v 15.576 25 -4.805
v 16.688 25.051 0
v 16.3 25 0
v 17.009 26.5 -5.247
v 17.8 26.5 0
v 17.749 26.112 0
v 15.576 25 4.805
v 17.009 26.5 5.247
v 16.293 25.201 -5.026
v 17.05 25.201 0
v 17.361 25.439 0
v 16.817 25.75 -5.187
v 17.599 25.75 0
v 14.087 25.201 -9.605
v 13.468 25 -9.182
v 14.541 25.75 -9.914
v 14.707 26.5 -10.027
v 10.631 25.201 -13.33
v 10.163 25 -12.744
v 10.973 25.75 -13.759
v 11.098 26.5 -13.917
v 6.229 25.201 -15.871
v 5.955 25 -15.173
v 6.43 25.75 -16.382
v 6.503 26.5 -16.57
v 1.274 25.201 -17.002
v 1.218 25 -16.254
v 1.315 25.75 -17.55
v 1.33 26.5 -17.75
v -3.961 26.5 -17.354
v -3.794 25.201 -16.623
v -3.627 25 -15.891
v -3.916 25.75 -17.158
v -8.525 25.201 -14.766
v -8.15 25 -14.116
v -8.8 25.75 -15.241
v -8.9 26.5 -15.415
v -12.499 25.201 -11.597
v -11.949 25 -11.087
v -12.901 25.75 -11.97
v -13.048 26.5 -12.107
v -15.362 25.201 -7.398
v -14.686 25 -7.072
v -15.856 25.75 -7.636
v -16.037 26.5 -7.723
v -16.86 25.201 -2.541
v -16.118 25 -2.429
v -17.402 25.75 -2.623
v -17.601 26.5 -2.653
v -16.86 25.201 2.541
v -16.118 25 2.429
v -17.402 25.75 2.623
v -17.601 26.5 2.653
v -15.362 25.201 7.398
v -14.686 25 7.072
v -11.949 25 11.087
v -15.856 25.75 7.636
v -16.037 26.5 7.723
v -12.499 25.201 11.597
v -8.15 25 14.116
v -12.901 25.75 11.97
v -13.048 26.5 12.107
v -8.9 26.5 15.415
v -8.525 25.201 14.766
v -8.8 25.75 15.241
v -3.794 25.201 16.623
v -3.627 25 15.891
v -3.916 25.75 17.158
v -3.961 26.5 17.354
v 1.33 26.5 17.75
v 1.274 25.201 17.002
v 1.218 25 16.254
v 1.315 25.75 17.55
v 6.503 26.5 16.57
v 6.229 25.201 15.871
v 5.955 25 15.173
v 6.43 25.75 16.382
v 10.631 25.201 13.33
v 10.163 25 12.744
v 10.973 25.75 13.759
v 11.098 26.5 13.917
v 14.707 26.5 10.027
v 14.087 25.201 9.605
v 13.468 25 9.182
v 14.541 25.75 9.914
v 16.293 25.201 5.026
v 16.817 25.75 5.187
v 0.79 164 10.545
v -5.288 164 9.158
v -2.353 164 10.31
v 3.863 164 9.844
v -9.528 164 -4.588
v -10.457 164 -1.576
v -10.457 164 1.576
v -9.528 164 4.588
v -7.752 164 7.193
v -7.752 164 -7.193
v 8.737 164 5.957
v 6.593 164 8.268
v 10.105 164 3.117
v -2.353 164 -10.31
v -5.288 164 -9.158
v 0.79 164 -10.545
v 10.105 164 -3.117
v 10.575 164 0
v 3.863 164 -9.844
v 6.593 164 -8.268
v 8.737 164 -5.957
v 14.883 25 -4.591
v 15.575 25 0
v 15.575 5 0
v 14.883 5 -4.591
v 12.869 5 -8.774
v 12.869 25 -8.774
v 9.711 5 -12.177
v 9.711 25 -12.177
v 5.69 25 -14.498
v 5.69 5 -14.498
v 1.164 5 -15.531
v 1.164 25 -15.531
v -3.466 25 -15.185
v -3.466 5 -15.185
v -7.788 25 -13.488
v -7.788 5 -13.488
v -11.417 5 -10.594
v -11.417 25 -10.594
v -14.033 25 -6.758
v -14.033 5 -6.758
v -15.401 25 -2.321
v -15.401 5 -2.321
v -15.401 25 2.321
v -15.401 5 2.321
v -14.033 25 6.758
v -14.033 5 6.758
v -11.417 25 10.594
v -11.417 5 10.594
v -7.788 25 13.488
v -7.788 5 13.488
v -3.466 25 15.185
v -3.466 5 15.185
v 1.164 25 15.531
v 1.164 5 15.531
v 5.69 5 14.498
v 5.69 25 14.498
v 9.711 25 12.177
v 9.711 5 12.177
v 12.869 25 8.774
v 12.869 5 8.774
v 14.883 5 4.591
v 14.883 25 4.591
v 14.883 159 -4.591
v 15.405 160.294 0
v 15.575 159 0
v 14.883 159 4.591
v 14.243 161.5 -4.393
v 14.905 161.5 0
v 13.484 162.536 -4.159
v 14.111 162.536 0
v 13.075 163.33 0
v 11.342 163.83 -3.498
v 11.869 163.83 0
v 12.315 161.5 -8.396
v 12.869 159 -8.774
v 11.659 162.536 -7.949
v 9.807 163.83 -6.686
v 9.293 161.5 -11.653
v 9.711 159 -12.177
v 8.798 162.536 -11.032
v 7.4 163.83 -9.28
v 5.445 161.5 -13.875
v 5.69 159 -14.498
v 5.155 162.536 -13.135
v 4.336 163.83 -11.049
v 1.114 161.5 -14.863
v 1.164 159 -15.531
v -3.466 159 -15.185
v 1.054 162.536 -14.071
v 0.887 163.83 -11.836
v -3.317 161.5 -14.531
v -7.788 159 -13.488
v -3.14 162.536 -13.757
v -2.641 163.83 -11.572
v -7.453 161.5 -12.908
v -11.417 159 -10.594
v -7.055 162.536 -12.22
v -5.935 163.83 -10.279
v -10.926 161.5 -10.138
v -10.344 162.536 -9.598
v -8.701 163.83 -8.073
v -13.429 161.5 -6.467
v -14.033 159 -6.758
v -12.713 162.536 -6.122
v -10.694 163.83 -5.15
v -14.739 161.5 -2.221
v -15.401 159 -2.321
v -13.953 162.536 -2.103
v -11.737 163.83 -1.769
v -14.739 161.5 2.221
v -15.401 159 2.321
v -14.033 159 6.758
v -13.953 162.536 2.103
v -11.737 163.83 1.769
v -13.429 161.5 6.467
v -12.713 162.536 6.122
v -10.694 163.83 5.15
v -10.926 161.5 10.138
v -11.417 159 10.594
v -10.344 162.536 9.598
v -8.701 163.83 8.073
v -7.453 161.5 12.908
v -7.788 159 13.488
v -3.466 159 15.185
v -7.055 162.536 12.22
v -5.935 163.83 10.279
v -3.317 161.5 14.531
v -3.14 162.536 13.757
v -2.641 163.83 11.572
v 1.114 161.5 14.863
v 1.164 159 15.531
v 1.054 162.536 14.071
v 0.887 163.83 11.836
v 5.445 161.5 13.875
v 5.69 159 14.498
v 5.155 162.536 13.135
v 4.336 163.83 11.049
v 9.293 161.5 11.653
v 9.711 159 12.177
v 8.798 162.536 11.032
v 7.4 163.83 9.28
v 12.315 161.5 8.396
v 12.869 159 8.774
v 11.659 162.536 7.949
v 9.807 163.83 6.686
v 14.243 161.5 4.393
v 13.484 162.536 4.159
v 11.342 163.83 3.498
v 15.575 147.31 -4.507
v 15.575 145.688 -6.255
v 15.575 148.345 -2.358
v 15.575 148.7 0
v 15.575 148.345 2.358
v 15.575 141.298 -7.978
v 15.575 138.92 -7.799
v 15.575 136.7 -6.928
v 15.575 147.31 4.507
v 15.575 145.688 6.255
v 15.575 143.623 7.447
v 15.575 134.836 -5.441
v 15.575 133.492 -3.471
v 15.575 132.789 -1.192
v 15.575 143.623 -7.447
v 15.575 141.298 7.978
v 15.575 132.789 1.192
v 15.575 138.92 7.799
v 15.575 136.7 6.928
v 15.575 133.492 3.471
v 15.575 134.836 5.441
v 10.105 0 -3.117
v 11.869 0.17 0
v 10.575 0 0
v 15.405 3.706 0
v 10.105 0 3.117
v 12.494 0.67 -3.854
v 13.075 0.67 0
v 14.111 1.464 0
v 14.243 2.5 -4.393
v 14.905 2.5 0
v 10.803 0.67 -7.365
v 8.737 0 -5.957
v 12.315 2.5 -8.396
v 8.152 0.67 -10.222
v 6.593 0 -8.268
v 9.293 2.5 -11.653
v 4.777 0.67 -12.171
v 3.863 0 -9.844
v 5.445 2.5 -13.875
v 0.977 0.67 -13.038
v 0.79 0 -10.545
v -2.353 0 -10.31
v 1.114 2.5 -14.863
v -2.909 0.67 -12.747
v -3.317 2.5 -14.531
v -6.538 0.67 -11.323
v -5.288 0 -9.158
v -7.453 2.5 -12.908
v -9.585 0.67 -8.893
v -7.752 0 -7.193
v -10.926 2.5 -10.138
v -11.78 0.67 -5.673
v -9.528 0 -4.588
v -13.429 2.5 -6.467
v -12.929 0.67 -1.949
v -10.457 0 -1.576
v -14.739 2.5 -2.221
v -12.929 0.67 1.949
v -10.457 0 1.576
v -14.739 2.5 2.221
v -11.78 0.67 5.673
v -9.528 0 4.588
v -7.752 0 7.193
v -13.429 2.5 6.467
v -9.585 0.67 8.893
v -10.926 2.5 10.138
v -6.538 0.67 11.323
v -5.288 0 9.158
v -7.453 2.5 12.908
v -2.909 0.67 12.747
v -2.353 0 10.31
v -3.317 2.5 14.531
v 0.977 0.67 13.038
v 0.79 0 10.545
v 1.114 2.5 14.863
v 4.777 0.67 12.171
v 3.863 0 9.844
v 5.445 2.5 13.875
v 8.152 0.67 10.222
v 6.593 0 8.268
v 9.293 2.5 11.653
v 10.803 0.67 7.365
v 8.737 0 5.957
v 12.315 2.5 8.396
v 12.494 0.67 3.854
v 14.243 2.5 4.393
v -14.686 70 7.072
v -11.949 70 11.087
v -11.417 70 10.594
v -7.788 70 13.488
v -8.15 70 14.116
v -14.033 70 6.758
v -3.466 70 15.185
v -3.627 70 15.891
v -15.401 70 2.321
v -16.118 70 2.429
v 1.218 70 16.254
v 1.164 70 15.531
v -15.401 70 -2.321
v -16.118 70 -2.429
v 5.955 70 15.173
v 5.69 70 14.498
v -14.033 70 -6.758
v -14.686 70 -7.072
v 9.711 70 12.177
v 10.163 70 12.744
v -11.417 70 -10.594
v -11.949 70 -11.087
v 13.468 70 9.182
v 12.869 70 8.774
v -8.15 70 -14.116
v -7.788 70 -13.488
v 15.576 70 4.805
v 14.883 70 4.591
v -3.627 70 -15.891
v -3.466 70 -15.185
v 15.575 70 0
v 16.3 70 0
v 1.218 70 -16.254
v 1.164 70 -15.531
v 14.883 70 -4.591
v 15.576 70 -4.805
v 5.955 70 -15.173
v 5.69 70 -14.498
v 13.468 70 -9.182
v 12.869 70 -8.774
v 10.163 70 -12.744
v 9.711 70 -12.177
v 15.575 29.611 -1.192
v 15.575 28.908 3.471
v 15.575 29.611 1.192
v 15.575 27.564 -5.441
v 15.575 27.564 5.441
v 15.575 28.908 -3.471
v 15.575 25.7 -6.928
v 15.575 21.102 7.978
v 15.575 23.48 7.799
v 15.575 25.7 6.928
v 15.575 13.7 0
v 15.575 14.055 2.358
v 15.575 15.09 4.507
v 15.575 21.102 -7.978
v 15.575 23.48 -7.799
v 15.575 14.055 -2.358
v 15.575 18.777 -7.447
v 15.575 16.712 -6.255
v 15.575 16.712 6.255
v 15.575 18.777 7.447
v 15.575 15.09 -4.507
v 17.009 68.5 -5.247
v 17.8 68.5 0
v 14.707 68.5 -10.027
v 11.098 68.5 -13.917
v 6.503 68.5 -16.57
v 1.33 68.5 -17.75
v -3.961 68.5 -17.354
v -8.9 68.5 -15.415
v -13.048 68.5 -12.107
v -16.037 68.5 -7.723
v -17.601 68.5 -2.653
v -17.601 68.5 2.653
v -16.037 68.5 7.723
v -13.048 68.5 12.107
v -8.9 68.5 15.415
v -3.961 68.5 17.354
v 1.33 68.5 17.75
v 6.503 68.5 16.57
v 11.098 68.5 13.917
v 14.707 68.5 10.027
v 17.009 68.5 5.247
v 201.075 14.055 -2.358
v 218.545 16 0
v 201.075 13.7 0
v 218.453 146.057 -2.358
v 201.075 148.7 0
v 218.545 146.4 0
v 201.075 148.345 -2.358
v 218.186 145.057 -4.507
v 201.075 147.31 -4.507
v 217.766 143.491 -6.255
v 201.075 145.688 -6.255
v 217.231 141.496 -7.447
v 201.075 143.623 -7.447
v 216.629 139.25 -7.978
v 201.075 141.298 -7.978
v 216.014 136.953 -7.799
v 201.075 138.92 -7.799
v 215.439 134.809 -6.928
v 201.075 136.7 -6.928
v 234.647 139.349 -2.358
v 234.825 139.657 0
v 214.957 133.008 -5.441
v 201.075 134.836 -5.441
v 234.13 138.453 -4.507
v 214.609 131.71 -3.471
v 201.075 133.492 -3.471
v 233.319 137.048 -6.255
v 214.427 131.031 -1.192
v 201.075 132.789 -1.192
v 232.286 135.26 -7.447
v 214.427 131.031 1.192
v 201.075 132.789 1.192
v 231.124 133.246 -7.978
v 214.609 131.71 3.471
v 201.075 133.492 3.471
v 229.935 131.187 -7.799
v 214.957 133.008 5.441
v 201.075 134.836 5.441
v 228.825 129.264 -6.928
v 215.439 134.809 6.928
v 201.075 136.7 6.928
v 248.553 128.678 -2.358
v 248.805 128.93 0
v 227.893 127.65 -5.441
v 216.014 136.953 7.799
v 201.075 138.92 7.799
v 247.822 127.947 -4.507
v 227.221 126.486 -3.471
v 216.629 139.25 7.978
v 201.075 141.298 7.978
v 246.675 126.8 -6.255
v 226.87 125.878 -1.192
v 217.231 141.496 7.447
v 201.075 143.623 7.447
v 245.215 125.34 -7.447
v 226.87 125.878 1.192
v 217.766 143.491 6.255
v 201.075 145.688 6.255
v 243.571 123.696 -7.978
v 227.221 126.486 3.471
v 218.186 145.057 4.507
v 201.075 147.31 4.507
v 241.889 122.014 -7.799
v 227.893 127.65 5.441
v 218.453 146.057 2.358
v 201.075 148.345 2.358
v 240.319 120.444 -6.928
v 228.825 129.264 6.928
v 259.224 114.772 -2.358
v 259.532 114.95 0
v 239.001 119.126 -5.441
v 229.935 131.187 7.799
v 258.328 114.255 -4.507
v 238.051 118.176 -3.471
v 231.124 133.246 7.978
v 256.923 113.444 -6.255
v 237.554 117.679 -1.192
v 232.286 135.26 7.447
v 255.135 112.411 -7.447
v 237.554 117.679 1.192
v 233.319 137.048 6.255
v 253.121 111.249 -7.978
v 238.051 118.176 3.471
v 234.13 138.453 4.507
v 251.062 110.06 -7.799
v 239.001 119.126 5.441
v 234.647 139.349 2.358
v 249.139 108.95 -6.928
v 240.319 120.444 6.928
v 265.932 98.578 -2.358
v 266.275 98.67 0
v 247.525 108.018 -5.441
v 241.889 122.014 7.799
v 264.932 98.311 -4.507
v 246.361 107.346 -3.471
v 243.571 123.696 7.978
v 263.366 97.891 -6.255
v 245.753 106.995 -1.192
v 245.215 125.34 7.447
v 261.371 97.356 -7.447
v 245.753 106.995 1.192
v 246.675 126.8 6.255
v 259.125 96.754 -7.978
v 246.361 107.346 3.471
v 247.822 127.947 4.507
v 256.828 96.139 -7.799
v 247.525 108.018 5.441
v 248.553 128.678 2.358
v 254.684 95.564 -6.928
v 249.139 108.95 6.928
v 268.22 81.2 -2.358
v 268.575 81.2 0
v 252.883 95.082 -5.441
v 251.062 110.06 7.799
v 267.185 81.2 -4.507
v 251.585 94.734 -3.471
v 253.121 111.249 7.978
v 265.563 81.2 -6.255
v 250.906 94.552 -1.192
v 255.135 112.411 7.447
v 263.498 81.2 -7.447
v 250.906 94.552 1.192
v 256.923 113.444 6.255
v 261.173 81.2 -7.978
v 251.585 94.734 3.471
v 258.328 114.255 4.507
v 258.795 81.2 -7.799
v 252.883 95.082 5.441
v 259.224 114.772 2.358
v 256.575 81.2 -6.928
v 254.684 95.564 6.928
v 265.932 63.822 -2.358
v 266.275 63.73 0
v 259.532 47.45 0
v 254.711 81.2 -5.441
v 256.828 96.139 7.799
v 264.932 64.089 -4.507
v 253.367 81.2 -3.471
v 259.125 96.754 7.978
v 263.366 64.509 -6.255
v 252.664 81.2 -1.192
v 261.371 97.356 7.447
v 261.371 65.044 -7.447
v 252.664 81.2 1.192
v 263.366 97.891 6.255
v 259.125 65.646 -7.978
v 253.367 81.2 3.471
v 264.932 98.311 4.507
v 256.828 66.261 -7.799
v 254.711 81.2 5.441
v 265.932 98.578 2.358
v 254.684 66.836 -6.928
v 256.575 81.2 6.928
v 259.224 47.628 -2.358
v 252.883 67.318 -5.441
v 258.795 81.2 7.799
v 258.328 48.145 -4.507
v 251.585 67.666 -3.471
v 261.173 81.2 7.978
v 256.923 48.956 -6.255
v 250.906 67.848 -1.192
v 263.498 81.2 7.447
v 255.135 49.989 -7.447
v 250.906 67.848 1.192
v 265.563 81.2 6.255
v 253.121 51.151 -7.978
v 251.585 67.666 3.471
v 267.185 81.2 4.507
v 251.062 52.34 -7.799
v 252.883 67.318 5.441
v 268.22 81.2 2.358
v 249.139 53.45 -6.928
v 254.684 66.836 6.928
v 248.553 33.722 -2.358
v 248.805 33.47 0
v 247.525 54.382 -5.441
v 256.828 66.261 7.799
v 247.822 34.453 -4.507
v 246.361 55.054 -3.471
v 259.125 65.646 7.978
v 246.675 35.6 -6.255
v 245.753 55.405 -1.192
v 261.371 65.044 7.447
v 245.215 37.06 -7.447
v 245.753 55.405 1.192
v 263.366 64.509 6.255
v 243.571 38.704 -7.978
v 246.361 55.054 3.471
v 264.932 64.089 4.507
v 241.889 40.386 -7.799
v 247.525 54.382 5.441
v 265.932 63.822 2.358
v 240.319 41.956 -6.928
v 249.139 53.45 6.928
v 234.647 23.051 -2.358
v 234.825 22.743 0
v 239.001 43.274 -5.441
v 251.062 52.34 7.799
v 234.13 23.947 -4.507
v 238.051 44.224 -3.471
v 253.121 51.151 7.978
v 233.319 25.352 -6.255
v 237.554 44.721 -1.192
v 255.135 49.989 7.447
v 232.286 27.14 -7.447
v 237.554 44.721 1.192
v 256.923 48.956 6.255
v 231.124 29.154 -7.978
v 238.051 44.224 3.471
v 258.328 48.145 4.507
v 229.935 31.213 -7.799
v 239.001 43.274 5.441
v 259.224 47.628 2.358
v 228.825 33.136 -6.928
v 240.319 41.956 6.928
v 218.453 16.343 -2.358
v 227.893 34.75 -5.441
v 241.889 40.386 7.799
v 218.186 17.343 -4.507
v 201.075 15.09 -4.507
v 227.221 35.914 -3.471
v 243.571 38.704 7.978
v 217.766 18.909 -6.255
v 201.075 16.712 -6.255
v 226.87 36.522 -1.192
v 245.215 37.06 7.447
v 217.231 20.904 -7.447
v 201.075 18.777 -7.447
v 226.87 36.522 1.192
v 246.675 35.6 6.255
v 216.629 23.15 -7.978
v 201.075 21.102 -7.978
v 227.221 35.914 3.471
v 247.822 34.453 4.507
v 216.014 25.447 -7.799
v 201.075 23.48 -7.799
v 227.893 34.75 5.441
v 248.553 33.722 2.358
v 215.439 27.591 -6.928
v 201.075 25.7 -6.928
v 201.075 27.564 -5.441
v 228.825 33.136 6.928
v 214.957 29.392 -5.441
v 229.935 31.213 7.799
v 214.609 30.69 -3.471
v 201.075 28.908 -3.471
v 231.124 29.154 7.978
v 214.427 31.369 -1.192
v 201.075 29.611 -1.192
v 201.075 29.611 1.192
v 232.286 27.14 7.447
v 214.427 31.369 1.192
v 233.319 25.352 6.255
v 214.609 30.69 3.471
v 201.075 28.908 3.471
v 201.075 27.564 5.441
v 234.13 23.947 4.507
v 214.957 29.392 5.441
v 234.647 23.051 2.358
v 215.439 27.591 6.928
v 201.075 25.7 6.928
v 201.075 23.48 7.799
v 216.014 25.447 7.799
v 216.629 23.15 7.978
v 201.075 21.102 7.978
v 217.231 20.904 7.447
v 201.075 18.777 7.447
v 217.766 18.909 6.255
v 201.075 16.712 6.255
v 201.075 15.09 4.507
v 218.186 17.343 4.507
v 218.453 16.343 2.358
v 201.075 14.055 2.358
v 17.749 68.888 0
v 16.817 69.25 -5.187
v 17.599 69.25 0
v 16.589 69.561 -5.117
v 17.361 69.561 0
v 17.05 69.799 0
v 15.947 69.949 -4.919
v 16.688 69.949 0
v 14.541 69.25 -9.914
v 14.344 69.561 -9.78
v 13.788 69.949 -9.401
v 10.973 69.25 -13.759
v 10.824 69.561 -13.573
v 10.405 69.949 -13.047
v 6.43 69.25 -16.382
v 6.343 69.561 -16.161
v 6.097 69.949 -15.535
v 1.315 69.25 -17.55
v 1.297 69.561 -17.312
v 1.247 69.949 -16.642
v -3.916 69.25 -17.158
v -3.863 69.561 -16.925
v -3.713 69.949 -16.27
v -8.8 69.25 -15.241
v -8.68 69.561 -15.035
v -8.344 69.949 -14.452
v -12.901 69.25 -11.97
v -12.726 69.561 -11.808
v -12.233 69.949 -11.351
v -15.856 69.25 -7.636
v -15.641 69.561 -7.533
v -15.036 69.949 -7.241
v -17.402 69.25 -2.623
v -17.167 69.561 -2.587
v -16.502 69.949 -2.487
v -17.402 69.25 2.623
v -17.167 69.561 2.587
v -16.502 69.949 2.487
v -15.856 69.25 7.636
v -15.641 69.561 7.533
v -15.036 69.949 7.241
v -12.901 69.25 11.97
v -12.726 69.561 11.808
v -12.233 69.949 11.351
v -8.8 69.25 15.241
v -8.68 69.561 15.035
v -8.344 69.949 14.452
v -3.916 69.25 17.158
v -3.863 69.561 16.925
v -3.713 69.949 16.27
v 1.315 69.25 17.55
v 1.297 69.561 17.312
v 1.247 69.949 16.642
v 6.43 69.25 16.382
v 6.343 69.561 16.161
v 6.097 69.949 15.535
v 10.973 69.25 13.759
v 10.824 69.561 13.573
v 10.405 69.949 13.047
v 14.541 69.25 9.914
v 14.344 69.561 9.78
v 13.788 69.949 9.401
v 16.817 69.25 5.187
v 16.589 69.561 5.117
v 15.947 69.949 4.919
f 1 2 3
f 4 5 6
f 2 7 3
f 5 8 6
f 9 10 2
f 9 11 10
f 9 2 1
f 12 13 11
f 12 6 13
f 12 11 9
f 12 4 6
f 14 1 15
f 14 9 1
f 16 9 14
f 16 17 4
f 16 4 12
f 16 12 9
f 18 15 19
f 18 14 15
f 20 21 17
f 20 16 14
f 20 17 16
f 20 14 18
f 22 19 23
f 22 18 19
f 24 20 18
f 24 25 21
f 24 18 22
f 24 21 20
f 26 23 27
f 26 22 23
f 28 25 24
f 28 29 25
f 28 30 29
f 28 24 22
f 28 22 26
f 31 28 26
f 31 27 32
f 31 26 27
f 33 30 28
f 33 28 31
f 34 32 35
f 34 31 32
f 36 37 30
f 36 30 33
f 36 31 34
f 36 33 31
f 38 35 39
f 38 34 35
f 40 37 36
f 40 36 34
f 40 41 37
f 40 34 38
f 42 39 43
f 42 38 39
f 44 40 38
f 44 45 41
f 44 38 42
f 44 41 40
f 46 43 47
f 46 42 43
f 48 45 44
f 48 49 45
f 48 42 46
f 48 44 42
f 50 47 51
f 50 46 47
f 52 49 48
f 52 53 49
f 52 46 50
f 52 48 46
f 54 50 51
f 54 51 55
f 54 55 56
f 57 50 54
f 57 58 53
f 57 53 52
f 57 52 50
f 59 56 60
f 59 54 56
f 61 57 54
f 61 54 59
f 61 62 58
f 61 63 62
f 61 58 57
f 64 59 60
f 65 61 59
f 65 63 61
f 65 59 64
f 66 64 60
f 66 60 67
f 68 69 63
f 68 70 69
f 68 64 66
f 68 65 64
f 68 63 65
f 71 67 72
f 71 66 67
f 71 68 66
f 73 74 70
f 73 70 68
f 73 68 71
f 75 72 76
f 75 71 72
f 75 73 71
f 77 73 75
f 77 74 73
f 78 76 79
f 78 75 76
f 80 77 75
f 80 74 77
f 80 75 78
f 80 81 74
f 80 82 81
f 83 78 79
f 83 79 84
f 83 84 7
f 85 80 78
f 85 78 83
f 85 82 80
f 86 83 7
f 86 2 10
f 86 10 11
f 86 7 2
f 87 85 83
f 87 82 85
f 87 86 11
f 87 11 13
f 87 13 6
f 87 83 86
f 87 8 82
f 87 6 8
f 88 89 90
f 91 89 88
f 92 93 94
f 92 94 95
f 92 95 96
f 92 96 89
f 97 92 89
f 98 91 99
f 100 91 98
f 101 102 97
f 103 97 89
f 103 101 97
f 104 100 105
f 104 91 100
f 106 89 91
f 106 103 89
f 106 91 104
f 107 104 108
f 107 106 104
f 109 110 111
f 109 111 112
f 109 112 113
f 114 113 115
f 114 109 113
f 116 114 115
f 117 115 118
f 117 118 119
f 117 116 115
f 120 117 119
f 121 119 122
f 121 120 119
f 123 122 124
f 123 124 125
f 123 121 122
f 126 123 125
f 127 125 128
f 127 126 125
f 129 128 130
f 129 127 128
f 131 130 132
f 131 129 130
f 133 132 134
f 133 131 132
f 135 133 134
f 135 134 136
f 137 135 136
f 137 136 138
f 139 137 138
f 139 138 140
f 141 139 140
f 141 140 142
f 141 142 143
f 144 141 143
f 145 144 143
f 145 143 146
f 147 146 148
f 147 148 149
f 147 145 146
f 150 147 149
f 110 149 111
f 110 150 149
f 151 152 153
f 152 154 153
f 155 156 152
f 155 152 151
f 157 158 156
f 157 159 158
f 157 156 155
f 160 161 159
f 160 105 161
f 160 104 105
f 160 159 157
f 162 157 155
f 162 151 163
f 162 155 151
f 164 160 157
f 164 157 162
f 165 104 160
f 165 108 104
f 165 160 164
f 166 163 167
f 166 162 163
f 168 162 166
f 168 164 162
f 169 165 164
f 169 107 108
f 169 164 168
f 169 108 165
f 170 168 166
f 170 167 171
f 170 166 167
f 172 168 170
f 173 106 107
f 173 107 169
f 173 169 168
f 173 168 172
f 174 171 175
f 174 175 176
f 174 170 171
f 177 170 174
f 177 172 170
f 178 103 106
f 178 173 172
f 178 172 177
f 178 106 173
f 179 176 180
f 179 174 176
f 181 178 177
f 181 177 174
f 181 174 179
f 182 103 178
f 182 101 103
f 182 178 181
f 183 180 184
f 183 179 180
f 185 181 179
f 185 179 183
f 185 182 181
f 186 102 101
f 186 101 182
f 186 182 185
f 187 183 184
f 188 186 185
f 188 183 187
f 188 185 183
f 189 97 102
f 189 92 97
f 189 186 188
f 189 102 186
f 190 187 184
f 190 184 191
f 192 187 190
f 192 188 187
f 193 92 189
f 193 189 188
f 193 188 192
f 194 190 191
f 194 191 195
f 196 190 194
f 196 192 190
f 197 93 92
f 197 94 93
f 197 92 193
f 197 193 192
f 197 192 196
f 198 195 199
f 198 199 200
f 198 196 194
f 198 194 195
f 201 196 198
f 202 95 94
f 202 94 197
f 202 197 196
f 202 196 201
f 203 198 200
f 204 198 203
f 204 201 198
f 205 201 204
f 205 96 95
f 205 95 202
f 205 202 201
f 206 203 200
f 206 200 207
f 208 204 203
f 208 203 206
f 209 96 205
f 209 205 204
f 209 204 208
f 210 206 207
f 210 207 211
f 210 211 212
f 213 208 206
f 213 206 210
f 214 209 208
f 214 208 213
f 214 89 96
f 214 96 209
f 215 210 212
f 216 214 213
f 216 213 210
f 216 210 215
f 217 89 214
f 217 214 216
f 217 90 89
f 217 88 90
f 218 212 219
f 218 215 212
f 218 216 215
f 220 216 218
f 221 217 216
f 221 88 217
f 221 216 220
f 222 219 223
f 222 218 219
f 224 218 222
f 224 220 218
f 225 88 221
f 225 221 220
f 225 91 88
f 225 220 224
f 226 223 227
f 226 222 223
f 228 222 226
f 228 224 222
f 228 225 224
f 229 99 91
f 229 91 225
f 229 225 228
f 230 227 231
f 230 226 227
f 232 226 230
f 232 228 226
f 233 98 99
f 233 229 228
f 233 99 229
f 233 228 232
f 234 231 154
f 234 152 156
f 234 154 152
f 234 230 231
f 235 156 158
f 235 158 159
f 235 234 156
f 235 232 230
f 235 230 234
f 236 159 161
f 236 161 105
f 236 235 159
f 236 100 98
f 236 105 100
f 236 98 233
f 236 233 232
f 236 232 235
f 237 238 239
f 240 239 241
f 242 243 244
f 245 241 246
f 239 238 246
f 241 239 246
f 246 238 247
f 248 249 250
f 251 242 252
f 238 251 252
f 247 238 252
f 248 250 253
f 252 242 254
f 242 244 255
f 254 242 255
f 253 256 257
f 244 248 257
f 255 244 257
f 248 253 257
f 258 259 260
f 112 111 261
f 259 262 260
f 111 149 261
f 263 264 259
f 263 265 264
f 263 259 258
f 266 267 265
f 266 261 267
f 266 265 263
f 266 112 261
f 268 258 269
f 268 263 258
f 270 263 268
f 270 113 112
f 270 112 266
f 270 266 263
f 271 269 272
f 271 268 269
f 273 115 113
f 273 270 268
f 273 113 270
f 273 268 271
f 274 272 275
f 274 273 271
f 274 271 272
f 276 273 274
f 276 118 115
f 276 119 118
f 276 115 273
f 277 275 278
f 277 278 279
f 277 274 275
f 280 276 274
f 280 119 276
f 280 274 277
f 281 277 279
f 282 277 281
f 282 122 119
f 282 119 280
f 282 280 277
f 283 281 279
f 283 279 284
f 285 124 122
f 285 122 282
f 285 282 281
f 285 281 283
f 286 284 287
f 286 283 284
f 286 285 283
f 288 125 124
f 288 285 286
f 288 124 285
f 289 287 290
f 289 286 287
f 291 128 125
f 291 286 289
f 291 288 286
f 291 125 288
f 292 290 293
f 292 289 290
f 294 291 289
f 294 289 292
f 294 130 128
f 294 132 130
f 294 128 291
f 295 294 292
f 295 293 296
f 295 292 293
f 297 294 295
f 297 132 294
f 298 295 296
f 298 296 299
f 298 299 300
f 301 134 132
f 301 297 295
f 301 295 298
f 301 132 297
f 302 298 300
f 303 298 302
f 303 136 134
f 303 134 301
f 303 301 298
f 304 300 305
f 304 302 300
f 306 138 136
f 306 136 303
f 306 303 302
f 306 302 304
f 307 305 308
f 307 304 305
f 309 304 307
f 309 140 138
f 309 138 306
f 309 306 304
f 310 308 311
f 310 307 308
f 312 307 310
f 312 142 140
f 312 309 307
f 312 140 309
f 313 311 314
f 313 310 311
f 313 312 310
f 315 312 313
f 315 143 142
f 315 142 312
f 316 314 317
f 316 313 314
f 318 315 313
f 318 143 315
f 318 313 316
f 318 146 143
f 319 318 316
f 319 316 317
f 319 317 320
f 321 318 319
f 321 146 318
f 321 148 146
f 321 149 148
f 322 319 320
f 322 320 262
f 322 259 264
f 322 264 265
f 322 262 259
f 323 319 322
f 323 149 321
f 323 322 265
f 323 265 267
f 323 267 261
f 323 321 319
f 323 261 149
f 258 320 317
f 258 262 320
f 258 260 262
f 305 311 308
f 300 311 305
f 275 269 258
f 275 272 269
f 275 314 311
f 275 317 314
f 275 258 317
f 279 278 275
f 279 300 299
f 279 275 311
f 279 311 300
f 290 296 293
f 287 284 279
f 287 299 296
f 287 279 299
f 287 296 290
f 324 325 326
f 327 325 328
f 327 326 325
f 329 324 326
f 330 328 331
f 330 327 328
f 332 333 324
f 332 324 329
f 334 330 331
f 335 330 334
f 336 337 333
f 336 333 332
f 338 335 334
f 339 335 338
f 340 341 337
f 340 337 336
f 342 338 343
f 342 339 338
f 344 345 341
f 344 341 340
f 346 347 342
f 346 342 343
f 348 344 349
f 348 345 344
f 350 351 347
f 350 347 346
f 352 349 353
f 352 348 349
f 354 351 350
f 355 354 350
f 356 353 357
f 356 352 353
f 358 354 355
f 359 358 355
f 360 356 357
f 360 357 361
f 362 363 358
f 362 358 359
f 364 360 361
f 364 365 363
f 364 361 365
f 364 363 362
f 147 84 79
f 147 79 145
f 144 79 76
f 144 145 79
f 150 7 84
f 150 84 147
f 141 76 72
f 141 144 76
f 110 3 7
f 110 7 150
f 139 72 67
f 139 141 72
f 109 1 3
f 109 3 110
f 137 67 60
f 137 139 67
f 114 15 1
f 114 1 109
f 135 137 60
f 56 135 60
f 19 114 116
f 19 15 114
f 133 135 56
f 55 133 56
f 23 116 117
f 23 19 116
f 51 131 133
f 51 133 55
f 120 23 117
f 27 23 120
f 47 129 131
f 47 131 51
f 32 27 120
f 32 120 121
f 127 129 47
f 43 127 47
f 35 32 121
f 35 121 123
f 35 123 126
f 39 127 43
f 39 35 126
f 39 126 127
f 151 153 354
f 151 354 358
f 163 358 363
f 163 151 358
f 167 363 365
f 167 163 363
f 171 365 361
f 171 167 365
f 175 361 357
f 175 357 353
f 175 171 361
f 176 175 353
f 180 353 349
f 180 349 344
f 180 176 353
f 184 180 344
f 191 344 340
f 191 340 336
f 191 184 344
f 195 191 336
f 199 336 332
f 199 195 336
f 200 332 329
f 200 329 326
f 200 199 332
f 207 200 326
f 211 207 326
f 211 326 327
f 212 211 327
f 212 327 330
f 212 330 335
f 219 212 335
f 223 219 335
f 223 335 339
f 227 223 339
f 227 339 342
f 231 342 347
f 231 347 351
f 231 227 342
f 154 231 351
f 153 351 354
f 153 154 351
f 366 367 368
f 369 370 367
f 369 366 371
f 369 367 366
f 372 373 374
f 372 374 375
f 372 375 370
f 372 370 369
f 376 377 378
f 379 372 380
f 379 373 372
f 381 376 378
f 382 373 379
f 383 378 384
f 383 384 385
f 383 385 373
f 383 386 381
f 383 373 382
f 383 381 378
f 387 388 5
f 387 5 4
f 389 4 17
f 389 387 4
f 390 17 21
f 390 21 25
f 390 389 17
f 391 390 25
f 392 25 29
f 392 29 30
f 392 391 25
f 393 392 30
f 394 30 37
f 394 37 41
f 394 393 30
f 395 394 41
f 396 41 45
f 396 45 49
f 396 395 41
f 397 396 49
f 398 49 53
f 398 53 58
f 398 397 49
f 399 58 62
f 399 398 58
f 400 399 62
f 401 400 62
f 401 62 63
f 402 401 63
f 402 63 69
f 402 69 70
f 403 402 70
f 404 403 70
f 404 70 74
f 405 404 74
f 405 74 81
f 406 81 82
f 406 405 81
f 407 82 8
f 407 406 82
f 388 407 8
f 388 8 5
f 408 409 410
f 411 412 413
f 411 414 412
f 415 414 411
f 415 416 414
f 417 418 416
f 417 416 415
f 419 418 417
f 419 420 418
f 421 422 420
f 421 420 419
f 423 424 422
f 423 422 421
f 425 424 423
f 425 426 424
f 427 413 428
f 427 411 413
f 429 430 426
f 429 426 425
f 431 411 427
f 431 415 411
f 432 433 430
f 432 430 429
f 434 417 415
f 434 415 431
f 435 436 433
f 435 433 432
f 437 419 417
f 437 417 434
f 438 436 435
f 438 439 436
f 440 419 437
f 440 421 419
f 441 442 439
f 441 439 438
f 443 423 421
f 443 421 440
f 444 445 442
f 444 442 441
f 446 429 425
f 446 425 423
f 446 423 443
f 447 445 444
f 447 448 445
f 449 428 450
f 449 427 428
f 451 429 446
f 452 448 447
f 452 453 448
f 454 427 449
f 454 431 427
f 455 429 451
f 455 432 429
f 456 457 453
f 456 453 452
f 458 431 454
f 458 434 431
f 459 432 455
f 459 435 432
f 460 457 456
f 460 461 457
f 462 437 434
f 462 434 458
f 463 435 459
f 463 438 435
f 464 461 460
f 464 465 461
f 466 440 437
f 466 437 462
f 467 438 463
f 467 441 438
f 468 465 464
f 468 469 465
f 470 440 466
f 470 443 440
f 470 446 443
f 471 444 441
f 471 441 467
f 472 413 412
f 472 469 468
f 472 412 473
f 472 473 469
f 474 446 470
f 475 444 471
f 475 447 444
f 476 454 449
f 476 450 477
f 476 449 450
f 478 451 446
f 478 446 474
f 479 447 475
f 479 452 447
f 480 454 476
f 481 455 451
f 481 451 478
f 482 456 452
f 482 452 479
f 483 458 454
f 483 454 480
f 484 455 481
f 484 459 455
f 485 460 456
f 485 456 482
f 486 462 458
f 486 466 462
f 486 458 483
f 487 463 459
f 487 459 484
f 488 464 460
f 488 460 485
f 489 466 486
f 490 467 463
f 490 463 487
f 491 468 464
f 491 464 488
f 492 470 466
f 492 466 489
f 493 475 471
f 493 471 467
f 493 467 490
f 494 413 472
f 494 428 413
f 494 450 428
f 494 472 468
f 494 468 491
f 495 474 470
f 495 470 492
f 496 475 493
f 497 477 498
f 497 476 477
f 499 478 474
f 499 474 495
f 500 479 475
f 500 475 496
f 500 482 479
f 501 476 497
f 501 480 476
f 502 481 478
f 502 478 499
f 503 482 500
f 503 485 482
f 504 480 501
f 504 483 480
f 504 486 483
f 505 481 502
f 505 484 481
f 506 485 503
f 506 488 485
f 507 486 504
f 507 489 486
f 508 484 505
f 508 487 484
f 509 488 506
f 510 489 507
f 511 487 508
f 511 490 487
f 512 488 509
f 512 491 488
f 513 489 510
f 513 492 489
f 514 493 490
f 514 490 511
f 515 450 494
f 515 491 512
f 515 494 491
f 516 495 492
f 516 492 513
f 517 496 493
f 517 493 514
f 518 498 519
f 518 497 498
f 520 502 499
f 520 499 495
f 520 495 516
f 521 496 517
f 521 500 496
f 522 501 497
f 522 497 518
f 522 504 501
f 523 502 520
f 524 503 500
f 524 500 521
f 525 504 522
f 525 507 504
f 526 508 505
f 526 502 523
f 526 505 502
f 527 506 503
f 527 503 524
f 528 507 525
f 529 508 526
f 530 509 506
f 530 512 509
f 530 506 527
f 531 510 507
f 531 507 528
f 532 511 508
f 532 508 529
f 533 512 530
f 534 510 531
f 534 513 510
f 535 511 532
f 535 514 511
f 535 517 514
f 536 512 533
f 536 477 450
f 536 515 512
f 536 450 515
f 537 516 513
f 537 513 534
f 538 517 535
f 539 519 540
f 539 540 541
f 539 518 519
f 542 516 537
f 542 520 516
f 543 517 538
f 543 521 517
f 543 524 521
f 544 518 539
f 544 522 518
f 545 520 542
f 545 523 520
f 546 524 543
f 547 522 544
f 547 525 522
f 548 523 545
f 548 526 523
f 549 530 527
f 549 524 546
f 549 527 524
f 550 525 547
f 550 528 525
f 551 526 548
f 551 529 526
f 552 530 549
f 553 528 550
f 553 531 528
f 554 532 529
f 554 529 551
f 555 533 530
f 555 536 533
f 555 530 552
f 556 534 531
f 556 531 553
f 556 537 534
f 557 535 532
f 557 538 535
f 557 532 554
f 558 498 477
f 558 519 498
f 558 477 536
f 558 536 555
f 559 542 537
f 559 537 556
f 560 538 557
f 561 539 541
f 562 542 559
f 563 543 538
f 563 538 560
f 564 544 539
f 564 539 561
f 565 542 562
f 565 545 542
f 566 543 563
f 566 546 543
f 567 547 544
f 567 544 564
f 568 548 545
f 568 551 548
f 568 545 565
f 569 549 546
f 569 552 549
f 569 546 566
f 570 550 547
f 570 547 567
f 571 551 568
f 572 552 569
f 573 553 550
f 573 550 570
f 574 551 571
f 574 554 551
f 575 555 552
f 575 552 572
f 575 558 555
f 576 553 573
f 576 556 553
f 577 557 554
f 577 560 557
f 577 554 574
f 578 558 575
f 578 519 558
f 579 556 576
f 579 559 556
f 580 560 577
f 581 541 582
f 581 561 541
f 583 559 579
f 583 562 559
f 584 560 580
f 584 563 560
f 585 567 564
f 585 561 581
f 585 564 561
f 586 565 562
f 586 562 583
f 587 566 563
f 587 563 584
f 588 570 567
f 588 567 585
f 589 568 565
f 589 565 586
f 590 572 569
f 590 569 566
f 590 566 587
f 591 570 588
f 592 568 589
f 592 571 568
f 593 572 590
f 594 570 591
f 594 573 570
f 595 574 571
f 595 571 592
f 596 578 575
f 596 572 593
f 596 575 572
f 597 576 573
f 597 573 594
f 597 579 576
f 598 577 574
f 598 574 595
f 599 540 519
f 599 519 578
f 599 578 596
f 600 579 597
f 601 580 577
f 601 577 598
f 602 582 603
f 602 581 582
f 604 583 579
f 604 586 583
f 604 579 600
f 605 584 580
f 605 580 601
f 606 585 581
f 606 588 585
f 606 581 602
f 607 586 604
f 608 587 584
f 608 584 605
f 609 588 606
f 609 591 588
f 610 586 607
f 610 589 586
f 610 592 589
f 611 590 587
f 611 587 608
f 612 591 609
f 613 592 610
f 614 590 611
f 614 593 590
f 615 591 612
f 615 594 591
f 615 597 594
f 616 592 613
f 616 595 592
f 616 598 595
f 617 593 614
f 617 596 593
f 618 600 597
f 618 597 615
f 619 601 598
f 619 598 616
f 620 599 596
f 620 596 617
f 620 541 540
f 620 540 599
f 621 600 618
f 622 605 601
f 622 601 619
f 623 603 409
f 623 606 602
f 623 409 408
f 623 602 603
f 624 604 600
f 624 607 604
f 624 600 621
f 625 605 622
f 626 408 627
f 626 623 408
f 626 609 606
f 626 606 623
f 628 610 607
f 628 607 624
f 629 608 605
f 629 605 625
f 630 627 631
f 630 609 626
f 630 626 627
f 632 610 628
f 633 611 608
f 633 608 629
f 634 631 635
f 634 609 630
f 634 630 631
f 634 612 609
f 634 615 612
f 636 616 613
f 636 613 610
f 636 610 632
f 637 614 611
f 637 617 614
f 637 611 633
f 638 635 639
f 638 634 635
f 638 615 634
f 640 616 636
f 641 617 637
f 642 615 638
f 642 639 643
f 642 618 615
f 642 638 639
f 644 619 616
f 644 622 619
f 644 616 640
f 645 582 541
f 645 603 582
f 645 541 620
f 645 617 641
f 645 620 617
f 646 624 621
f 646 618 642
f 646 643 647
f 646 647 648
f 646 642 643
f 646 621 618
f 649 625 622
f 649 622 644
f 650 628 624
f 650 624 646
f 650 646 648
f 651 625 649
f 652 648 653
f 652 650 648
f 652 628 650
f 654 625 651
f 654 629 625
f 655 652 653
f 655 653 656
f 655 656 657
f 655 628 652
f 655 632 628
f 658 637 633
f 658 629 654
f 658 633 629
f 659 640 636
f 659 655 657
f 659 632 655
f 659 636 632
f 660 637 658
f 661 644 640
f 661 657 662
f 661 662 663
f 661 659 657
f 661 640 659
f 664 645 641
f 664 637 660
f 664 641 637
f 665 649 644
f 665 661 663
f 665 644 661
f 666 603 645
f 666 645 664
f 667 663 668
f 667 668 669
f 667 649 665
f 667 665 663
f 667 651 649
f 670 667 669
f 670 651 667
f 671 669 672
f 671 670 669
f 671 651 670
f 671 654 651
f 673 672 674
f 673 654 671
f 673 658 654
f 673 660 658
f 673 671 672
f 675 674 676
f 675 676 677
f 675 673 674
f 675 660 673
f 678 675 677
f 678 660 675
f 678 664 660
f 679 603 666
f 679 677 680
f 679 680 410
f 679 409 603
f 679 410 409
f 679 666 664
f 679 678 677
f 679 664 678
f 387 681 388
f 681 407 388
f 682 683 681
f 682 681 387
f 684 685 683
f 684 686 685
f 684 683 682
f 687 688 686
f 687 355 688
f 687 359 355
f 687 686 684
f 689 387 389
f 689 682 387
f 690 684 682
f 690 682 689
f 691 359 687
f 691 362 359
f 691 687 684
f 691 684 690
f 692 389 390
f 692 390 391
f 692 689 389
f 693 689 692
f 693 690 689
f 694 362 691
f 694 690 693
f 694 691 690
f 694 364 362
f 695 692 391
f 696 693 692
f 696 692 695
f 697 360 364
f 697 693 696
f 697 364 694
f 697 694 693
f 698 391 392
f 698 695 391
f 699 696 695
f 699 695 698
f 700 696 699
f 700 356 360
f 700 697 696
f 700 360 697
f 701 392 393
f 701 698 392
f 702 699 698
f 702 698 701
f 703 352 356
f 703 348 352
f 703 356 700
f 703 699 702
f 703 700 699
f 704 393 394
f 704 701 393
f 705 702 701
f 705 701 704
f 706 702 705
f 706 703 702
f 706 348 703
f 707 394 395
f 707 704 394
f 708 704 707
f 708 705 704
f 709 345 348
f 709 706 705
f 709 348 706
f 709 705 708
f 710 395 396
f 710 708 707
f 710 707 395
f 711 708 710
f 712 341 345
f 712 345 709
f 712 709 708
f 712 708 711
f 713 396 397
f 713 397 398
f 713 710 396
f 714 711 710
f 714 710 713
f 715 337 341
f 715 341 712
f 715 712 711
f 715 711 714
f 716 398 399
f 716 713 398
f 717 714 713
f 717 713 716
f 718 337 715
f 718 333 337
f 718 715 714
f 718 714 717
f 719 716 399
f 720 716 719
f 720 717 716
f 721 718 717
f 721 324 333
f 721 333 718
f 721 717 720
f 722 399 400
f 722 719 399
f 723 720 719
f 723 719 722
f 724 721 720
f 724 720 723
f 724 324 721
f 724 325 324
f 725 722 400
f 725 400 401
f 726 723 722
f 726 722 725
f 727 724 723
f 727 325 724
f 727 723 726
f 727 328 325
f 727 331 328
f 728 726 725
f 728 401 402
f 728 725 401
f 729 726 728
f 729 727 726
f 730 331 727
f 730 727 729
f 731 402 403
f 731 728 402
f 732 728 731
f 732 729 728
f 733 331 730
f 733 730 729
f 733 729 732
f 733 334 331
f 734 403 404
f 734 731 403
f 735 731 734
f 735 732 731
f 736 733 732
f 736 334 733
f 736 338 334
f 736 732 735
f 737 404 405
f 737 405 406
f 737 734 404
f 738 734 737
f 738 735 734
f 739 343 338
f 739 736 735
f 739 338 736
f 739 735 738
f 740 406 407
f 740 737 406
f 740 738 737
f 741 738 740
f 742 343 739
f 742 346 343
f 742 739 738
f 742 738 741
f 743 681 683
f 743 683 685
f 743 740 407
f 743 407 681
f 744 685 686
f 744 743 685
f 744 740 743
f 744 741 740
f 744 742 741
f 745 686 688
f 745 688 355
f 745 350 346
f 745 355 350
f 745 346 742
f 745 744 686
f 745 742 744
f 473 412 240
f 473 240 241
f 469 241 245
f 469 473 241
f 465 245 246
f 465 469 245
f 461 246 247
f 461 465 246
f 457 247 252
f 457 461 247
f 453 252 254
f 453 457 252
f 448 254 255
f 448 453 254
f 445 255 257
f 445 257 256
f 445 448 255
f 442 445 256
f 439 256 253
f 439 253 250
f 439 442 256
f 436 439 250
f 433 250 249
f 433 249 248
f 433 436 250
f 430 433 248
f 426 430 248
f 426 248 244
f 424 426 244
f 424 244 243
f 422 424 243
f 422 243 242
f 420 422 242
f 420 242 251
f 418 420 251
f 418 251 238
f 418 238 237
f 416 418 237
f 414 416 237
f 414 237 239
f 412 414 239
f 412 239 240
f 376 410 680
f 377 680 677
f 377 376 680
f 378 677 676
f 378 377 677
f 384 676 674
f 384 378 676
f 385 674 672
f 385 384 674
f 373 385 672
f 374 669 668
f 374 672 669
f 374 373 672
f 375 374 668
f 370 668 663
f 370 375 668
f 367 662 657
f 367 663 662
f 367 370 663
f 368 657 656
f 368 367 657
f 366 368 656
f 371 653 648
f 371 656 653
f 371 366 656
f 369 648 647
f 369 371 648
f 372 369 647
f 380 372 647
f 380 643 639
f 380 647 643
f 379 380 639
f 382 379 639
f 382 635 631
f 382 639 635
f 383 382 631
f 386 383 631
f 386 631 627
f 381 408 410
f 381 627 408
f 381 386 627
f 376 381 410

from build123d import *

# Parameters (mm, degrees)
F2_R = 5
F3_R = 1.5
F6_R = 8


with BuildPart() as f1:
    # F0 (on Top) → F1 (revolve)
    with BuildSketch(Plane.XY):
        Polygon((0, 164), (0, 0), (15.575, 0), (15.575, 25), (17.8, 25), (17.8, 70), (15.575, 70), (15.575, 164), align=None)
    revolve(axis=Axis((0, 82, 0), (0, 1, 0)))

    # F2
    f2_edges = [f1.edges().sort_by_distance(p)[0] for p in [
        (-15.575, 164, 0),
        (-15.575, 0, 0),
    ]]
    fillet(f2_edges, radius=F2_R)

    # F3
    f3_edges = [f1.edges().sort_by_distance(p)[0] for p in [
        (-17.8, 70, 0),
        (-17.8, 25, 0),
    ]]
    fillet(f3_edges, radius=F3_R)


with BuildPart() as f7:
    # F7: sweep along a path in F4
    with BuildLine(Plane.XY) as f7_path:
        Line((15.575, 140.7), (201.075, 140.7))
        ThreePointArc((201.075, 140.7), (260.575, 81.2), (201.075, 21.7))
        Line((201.075, 21.7), (15.575, 21.7))
    # F6 (on plane+point) → F7 (sweep)
    with BuildSketch(Plane.YZ.offset(15.575)):
        with Locations((140.7, 0)):
            Circle(F6_R)
    sweep(path=f7_path.line)


solid = Compound([f1.part, f7.part])
